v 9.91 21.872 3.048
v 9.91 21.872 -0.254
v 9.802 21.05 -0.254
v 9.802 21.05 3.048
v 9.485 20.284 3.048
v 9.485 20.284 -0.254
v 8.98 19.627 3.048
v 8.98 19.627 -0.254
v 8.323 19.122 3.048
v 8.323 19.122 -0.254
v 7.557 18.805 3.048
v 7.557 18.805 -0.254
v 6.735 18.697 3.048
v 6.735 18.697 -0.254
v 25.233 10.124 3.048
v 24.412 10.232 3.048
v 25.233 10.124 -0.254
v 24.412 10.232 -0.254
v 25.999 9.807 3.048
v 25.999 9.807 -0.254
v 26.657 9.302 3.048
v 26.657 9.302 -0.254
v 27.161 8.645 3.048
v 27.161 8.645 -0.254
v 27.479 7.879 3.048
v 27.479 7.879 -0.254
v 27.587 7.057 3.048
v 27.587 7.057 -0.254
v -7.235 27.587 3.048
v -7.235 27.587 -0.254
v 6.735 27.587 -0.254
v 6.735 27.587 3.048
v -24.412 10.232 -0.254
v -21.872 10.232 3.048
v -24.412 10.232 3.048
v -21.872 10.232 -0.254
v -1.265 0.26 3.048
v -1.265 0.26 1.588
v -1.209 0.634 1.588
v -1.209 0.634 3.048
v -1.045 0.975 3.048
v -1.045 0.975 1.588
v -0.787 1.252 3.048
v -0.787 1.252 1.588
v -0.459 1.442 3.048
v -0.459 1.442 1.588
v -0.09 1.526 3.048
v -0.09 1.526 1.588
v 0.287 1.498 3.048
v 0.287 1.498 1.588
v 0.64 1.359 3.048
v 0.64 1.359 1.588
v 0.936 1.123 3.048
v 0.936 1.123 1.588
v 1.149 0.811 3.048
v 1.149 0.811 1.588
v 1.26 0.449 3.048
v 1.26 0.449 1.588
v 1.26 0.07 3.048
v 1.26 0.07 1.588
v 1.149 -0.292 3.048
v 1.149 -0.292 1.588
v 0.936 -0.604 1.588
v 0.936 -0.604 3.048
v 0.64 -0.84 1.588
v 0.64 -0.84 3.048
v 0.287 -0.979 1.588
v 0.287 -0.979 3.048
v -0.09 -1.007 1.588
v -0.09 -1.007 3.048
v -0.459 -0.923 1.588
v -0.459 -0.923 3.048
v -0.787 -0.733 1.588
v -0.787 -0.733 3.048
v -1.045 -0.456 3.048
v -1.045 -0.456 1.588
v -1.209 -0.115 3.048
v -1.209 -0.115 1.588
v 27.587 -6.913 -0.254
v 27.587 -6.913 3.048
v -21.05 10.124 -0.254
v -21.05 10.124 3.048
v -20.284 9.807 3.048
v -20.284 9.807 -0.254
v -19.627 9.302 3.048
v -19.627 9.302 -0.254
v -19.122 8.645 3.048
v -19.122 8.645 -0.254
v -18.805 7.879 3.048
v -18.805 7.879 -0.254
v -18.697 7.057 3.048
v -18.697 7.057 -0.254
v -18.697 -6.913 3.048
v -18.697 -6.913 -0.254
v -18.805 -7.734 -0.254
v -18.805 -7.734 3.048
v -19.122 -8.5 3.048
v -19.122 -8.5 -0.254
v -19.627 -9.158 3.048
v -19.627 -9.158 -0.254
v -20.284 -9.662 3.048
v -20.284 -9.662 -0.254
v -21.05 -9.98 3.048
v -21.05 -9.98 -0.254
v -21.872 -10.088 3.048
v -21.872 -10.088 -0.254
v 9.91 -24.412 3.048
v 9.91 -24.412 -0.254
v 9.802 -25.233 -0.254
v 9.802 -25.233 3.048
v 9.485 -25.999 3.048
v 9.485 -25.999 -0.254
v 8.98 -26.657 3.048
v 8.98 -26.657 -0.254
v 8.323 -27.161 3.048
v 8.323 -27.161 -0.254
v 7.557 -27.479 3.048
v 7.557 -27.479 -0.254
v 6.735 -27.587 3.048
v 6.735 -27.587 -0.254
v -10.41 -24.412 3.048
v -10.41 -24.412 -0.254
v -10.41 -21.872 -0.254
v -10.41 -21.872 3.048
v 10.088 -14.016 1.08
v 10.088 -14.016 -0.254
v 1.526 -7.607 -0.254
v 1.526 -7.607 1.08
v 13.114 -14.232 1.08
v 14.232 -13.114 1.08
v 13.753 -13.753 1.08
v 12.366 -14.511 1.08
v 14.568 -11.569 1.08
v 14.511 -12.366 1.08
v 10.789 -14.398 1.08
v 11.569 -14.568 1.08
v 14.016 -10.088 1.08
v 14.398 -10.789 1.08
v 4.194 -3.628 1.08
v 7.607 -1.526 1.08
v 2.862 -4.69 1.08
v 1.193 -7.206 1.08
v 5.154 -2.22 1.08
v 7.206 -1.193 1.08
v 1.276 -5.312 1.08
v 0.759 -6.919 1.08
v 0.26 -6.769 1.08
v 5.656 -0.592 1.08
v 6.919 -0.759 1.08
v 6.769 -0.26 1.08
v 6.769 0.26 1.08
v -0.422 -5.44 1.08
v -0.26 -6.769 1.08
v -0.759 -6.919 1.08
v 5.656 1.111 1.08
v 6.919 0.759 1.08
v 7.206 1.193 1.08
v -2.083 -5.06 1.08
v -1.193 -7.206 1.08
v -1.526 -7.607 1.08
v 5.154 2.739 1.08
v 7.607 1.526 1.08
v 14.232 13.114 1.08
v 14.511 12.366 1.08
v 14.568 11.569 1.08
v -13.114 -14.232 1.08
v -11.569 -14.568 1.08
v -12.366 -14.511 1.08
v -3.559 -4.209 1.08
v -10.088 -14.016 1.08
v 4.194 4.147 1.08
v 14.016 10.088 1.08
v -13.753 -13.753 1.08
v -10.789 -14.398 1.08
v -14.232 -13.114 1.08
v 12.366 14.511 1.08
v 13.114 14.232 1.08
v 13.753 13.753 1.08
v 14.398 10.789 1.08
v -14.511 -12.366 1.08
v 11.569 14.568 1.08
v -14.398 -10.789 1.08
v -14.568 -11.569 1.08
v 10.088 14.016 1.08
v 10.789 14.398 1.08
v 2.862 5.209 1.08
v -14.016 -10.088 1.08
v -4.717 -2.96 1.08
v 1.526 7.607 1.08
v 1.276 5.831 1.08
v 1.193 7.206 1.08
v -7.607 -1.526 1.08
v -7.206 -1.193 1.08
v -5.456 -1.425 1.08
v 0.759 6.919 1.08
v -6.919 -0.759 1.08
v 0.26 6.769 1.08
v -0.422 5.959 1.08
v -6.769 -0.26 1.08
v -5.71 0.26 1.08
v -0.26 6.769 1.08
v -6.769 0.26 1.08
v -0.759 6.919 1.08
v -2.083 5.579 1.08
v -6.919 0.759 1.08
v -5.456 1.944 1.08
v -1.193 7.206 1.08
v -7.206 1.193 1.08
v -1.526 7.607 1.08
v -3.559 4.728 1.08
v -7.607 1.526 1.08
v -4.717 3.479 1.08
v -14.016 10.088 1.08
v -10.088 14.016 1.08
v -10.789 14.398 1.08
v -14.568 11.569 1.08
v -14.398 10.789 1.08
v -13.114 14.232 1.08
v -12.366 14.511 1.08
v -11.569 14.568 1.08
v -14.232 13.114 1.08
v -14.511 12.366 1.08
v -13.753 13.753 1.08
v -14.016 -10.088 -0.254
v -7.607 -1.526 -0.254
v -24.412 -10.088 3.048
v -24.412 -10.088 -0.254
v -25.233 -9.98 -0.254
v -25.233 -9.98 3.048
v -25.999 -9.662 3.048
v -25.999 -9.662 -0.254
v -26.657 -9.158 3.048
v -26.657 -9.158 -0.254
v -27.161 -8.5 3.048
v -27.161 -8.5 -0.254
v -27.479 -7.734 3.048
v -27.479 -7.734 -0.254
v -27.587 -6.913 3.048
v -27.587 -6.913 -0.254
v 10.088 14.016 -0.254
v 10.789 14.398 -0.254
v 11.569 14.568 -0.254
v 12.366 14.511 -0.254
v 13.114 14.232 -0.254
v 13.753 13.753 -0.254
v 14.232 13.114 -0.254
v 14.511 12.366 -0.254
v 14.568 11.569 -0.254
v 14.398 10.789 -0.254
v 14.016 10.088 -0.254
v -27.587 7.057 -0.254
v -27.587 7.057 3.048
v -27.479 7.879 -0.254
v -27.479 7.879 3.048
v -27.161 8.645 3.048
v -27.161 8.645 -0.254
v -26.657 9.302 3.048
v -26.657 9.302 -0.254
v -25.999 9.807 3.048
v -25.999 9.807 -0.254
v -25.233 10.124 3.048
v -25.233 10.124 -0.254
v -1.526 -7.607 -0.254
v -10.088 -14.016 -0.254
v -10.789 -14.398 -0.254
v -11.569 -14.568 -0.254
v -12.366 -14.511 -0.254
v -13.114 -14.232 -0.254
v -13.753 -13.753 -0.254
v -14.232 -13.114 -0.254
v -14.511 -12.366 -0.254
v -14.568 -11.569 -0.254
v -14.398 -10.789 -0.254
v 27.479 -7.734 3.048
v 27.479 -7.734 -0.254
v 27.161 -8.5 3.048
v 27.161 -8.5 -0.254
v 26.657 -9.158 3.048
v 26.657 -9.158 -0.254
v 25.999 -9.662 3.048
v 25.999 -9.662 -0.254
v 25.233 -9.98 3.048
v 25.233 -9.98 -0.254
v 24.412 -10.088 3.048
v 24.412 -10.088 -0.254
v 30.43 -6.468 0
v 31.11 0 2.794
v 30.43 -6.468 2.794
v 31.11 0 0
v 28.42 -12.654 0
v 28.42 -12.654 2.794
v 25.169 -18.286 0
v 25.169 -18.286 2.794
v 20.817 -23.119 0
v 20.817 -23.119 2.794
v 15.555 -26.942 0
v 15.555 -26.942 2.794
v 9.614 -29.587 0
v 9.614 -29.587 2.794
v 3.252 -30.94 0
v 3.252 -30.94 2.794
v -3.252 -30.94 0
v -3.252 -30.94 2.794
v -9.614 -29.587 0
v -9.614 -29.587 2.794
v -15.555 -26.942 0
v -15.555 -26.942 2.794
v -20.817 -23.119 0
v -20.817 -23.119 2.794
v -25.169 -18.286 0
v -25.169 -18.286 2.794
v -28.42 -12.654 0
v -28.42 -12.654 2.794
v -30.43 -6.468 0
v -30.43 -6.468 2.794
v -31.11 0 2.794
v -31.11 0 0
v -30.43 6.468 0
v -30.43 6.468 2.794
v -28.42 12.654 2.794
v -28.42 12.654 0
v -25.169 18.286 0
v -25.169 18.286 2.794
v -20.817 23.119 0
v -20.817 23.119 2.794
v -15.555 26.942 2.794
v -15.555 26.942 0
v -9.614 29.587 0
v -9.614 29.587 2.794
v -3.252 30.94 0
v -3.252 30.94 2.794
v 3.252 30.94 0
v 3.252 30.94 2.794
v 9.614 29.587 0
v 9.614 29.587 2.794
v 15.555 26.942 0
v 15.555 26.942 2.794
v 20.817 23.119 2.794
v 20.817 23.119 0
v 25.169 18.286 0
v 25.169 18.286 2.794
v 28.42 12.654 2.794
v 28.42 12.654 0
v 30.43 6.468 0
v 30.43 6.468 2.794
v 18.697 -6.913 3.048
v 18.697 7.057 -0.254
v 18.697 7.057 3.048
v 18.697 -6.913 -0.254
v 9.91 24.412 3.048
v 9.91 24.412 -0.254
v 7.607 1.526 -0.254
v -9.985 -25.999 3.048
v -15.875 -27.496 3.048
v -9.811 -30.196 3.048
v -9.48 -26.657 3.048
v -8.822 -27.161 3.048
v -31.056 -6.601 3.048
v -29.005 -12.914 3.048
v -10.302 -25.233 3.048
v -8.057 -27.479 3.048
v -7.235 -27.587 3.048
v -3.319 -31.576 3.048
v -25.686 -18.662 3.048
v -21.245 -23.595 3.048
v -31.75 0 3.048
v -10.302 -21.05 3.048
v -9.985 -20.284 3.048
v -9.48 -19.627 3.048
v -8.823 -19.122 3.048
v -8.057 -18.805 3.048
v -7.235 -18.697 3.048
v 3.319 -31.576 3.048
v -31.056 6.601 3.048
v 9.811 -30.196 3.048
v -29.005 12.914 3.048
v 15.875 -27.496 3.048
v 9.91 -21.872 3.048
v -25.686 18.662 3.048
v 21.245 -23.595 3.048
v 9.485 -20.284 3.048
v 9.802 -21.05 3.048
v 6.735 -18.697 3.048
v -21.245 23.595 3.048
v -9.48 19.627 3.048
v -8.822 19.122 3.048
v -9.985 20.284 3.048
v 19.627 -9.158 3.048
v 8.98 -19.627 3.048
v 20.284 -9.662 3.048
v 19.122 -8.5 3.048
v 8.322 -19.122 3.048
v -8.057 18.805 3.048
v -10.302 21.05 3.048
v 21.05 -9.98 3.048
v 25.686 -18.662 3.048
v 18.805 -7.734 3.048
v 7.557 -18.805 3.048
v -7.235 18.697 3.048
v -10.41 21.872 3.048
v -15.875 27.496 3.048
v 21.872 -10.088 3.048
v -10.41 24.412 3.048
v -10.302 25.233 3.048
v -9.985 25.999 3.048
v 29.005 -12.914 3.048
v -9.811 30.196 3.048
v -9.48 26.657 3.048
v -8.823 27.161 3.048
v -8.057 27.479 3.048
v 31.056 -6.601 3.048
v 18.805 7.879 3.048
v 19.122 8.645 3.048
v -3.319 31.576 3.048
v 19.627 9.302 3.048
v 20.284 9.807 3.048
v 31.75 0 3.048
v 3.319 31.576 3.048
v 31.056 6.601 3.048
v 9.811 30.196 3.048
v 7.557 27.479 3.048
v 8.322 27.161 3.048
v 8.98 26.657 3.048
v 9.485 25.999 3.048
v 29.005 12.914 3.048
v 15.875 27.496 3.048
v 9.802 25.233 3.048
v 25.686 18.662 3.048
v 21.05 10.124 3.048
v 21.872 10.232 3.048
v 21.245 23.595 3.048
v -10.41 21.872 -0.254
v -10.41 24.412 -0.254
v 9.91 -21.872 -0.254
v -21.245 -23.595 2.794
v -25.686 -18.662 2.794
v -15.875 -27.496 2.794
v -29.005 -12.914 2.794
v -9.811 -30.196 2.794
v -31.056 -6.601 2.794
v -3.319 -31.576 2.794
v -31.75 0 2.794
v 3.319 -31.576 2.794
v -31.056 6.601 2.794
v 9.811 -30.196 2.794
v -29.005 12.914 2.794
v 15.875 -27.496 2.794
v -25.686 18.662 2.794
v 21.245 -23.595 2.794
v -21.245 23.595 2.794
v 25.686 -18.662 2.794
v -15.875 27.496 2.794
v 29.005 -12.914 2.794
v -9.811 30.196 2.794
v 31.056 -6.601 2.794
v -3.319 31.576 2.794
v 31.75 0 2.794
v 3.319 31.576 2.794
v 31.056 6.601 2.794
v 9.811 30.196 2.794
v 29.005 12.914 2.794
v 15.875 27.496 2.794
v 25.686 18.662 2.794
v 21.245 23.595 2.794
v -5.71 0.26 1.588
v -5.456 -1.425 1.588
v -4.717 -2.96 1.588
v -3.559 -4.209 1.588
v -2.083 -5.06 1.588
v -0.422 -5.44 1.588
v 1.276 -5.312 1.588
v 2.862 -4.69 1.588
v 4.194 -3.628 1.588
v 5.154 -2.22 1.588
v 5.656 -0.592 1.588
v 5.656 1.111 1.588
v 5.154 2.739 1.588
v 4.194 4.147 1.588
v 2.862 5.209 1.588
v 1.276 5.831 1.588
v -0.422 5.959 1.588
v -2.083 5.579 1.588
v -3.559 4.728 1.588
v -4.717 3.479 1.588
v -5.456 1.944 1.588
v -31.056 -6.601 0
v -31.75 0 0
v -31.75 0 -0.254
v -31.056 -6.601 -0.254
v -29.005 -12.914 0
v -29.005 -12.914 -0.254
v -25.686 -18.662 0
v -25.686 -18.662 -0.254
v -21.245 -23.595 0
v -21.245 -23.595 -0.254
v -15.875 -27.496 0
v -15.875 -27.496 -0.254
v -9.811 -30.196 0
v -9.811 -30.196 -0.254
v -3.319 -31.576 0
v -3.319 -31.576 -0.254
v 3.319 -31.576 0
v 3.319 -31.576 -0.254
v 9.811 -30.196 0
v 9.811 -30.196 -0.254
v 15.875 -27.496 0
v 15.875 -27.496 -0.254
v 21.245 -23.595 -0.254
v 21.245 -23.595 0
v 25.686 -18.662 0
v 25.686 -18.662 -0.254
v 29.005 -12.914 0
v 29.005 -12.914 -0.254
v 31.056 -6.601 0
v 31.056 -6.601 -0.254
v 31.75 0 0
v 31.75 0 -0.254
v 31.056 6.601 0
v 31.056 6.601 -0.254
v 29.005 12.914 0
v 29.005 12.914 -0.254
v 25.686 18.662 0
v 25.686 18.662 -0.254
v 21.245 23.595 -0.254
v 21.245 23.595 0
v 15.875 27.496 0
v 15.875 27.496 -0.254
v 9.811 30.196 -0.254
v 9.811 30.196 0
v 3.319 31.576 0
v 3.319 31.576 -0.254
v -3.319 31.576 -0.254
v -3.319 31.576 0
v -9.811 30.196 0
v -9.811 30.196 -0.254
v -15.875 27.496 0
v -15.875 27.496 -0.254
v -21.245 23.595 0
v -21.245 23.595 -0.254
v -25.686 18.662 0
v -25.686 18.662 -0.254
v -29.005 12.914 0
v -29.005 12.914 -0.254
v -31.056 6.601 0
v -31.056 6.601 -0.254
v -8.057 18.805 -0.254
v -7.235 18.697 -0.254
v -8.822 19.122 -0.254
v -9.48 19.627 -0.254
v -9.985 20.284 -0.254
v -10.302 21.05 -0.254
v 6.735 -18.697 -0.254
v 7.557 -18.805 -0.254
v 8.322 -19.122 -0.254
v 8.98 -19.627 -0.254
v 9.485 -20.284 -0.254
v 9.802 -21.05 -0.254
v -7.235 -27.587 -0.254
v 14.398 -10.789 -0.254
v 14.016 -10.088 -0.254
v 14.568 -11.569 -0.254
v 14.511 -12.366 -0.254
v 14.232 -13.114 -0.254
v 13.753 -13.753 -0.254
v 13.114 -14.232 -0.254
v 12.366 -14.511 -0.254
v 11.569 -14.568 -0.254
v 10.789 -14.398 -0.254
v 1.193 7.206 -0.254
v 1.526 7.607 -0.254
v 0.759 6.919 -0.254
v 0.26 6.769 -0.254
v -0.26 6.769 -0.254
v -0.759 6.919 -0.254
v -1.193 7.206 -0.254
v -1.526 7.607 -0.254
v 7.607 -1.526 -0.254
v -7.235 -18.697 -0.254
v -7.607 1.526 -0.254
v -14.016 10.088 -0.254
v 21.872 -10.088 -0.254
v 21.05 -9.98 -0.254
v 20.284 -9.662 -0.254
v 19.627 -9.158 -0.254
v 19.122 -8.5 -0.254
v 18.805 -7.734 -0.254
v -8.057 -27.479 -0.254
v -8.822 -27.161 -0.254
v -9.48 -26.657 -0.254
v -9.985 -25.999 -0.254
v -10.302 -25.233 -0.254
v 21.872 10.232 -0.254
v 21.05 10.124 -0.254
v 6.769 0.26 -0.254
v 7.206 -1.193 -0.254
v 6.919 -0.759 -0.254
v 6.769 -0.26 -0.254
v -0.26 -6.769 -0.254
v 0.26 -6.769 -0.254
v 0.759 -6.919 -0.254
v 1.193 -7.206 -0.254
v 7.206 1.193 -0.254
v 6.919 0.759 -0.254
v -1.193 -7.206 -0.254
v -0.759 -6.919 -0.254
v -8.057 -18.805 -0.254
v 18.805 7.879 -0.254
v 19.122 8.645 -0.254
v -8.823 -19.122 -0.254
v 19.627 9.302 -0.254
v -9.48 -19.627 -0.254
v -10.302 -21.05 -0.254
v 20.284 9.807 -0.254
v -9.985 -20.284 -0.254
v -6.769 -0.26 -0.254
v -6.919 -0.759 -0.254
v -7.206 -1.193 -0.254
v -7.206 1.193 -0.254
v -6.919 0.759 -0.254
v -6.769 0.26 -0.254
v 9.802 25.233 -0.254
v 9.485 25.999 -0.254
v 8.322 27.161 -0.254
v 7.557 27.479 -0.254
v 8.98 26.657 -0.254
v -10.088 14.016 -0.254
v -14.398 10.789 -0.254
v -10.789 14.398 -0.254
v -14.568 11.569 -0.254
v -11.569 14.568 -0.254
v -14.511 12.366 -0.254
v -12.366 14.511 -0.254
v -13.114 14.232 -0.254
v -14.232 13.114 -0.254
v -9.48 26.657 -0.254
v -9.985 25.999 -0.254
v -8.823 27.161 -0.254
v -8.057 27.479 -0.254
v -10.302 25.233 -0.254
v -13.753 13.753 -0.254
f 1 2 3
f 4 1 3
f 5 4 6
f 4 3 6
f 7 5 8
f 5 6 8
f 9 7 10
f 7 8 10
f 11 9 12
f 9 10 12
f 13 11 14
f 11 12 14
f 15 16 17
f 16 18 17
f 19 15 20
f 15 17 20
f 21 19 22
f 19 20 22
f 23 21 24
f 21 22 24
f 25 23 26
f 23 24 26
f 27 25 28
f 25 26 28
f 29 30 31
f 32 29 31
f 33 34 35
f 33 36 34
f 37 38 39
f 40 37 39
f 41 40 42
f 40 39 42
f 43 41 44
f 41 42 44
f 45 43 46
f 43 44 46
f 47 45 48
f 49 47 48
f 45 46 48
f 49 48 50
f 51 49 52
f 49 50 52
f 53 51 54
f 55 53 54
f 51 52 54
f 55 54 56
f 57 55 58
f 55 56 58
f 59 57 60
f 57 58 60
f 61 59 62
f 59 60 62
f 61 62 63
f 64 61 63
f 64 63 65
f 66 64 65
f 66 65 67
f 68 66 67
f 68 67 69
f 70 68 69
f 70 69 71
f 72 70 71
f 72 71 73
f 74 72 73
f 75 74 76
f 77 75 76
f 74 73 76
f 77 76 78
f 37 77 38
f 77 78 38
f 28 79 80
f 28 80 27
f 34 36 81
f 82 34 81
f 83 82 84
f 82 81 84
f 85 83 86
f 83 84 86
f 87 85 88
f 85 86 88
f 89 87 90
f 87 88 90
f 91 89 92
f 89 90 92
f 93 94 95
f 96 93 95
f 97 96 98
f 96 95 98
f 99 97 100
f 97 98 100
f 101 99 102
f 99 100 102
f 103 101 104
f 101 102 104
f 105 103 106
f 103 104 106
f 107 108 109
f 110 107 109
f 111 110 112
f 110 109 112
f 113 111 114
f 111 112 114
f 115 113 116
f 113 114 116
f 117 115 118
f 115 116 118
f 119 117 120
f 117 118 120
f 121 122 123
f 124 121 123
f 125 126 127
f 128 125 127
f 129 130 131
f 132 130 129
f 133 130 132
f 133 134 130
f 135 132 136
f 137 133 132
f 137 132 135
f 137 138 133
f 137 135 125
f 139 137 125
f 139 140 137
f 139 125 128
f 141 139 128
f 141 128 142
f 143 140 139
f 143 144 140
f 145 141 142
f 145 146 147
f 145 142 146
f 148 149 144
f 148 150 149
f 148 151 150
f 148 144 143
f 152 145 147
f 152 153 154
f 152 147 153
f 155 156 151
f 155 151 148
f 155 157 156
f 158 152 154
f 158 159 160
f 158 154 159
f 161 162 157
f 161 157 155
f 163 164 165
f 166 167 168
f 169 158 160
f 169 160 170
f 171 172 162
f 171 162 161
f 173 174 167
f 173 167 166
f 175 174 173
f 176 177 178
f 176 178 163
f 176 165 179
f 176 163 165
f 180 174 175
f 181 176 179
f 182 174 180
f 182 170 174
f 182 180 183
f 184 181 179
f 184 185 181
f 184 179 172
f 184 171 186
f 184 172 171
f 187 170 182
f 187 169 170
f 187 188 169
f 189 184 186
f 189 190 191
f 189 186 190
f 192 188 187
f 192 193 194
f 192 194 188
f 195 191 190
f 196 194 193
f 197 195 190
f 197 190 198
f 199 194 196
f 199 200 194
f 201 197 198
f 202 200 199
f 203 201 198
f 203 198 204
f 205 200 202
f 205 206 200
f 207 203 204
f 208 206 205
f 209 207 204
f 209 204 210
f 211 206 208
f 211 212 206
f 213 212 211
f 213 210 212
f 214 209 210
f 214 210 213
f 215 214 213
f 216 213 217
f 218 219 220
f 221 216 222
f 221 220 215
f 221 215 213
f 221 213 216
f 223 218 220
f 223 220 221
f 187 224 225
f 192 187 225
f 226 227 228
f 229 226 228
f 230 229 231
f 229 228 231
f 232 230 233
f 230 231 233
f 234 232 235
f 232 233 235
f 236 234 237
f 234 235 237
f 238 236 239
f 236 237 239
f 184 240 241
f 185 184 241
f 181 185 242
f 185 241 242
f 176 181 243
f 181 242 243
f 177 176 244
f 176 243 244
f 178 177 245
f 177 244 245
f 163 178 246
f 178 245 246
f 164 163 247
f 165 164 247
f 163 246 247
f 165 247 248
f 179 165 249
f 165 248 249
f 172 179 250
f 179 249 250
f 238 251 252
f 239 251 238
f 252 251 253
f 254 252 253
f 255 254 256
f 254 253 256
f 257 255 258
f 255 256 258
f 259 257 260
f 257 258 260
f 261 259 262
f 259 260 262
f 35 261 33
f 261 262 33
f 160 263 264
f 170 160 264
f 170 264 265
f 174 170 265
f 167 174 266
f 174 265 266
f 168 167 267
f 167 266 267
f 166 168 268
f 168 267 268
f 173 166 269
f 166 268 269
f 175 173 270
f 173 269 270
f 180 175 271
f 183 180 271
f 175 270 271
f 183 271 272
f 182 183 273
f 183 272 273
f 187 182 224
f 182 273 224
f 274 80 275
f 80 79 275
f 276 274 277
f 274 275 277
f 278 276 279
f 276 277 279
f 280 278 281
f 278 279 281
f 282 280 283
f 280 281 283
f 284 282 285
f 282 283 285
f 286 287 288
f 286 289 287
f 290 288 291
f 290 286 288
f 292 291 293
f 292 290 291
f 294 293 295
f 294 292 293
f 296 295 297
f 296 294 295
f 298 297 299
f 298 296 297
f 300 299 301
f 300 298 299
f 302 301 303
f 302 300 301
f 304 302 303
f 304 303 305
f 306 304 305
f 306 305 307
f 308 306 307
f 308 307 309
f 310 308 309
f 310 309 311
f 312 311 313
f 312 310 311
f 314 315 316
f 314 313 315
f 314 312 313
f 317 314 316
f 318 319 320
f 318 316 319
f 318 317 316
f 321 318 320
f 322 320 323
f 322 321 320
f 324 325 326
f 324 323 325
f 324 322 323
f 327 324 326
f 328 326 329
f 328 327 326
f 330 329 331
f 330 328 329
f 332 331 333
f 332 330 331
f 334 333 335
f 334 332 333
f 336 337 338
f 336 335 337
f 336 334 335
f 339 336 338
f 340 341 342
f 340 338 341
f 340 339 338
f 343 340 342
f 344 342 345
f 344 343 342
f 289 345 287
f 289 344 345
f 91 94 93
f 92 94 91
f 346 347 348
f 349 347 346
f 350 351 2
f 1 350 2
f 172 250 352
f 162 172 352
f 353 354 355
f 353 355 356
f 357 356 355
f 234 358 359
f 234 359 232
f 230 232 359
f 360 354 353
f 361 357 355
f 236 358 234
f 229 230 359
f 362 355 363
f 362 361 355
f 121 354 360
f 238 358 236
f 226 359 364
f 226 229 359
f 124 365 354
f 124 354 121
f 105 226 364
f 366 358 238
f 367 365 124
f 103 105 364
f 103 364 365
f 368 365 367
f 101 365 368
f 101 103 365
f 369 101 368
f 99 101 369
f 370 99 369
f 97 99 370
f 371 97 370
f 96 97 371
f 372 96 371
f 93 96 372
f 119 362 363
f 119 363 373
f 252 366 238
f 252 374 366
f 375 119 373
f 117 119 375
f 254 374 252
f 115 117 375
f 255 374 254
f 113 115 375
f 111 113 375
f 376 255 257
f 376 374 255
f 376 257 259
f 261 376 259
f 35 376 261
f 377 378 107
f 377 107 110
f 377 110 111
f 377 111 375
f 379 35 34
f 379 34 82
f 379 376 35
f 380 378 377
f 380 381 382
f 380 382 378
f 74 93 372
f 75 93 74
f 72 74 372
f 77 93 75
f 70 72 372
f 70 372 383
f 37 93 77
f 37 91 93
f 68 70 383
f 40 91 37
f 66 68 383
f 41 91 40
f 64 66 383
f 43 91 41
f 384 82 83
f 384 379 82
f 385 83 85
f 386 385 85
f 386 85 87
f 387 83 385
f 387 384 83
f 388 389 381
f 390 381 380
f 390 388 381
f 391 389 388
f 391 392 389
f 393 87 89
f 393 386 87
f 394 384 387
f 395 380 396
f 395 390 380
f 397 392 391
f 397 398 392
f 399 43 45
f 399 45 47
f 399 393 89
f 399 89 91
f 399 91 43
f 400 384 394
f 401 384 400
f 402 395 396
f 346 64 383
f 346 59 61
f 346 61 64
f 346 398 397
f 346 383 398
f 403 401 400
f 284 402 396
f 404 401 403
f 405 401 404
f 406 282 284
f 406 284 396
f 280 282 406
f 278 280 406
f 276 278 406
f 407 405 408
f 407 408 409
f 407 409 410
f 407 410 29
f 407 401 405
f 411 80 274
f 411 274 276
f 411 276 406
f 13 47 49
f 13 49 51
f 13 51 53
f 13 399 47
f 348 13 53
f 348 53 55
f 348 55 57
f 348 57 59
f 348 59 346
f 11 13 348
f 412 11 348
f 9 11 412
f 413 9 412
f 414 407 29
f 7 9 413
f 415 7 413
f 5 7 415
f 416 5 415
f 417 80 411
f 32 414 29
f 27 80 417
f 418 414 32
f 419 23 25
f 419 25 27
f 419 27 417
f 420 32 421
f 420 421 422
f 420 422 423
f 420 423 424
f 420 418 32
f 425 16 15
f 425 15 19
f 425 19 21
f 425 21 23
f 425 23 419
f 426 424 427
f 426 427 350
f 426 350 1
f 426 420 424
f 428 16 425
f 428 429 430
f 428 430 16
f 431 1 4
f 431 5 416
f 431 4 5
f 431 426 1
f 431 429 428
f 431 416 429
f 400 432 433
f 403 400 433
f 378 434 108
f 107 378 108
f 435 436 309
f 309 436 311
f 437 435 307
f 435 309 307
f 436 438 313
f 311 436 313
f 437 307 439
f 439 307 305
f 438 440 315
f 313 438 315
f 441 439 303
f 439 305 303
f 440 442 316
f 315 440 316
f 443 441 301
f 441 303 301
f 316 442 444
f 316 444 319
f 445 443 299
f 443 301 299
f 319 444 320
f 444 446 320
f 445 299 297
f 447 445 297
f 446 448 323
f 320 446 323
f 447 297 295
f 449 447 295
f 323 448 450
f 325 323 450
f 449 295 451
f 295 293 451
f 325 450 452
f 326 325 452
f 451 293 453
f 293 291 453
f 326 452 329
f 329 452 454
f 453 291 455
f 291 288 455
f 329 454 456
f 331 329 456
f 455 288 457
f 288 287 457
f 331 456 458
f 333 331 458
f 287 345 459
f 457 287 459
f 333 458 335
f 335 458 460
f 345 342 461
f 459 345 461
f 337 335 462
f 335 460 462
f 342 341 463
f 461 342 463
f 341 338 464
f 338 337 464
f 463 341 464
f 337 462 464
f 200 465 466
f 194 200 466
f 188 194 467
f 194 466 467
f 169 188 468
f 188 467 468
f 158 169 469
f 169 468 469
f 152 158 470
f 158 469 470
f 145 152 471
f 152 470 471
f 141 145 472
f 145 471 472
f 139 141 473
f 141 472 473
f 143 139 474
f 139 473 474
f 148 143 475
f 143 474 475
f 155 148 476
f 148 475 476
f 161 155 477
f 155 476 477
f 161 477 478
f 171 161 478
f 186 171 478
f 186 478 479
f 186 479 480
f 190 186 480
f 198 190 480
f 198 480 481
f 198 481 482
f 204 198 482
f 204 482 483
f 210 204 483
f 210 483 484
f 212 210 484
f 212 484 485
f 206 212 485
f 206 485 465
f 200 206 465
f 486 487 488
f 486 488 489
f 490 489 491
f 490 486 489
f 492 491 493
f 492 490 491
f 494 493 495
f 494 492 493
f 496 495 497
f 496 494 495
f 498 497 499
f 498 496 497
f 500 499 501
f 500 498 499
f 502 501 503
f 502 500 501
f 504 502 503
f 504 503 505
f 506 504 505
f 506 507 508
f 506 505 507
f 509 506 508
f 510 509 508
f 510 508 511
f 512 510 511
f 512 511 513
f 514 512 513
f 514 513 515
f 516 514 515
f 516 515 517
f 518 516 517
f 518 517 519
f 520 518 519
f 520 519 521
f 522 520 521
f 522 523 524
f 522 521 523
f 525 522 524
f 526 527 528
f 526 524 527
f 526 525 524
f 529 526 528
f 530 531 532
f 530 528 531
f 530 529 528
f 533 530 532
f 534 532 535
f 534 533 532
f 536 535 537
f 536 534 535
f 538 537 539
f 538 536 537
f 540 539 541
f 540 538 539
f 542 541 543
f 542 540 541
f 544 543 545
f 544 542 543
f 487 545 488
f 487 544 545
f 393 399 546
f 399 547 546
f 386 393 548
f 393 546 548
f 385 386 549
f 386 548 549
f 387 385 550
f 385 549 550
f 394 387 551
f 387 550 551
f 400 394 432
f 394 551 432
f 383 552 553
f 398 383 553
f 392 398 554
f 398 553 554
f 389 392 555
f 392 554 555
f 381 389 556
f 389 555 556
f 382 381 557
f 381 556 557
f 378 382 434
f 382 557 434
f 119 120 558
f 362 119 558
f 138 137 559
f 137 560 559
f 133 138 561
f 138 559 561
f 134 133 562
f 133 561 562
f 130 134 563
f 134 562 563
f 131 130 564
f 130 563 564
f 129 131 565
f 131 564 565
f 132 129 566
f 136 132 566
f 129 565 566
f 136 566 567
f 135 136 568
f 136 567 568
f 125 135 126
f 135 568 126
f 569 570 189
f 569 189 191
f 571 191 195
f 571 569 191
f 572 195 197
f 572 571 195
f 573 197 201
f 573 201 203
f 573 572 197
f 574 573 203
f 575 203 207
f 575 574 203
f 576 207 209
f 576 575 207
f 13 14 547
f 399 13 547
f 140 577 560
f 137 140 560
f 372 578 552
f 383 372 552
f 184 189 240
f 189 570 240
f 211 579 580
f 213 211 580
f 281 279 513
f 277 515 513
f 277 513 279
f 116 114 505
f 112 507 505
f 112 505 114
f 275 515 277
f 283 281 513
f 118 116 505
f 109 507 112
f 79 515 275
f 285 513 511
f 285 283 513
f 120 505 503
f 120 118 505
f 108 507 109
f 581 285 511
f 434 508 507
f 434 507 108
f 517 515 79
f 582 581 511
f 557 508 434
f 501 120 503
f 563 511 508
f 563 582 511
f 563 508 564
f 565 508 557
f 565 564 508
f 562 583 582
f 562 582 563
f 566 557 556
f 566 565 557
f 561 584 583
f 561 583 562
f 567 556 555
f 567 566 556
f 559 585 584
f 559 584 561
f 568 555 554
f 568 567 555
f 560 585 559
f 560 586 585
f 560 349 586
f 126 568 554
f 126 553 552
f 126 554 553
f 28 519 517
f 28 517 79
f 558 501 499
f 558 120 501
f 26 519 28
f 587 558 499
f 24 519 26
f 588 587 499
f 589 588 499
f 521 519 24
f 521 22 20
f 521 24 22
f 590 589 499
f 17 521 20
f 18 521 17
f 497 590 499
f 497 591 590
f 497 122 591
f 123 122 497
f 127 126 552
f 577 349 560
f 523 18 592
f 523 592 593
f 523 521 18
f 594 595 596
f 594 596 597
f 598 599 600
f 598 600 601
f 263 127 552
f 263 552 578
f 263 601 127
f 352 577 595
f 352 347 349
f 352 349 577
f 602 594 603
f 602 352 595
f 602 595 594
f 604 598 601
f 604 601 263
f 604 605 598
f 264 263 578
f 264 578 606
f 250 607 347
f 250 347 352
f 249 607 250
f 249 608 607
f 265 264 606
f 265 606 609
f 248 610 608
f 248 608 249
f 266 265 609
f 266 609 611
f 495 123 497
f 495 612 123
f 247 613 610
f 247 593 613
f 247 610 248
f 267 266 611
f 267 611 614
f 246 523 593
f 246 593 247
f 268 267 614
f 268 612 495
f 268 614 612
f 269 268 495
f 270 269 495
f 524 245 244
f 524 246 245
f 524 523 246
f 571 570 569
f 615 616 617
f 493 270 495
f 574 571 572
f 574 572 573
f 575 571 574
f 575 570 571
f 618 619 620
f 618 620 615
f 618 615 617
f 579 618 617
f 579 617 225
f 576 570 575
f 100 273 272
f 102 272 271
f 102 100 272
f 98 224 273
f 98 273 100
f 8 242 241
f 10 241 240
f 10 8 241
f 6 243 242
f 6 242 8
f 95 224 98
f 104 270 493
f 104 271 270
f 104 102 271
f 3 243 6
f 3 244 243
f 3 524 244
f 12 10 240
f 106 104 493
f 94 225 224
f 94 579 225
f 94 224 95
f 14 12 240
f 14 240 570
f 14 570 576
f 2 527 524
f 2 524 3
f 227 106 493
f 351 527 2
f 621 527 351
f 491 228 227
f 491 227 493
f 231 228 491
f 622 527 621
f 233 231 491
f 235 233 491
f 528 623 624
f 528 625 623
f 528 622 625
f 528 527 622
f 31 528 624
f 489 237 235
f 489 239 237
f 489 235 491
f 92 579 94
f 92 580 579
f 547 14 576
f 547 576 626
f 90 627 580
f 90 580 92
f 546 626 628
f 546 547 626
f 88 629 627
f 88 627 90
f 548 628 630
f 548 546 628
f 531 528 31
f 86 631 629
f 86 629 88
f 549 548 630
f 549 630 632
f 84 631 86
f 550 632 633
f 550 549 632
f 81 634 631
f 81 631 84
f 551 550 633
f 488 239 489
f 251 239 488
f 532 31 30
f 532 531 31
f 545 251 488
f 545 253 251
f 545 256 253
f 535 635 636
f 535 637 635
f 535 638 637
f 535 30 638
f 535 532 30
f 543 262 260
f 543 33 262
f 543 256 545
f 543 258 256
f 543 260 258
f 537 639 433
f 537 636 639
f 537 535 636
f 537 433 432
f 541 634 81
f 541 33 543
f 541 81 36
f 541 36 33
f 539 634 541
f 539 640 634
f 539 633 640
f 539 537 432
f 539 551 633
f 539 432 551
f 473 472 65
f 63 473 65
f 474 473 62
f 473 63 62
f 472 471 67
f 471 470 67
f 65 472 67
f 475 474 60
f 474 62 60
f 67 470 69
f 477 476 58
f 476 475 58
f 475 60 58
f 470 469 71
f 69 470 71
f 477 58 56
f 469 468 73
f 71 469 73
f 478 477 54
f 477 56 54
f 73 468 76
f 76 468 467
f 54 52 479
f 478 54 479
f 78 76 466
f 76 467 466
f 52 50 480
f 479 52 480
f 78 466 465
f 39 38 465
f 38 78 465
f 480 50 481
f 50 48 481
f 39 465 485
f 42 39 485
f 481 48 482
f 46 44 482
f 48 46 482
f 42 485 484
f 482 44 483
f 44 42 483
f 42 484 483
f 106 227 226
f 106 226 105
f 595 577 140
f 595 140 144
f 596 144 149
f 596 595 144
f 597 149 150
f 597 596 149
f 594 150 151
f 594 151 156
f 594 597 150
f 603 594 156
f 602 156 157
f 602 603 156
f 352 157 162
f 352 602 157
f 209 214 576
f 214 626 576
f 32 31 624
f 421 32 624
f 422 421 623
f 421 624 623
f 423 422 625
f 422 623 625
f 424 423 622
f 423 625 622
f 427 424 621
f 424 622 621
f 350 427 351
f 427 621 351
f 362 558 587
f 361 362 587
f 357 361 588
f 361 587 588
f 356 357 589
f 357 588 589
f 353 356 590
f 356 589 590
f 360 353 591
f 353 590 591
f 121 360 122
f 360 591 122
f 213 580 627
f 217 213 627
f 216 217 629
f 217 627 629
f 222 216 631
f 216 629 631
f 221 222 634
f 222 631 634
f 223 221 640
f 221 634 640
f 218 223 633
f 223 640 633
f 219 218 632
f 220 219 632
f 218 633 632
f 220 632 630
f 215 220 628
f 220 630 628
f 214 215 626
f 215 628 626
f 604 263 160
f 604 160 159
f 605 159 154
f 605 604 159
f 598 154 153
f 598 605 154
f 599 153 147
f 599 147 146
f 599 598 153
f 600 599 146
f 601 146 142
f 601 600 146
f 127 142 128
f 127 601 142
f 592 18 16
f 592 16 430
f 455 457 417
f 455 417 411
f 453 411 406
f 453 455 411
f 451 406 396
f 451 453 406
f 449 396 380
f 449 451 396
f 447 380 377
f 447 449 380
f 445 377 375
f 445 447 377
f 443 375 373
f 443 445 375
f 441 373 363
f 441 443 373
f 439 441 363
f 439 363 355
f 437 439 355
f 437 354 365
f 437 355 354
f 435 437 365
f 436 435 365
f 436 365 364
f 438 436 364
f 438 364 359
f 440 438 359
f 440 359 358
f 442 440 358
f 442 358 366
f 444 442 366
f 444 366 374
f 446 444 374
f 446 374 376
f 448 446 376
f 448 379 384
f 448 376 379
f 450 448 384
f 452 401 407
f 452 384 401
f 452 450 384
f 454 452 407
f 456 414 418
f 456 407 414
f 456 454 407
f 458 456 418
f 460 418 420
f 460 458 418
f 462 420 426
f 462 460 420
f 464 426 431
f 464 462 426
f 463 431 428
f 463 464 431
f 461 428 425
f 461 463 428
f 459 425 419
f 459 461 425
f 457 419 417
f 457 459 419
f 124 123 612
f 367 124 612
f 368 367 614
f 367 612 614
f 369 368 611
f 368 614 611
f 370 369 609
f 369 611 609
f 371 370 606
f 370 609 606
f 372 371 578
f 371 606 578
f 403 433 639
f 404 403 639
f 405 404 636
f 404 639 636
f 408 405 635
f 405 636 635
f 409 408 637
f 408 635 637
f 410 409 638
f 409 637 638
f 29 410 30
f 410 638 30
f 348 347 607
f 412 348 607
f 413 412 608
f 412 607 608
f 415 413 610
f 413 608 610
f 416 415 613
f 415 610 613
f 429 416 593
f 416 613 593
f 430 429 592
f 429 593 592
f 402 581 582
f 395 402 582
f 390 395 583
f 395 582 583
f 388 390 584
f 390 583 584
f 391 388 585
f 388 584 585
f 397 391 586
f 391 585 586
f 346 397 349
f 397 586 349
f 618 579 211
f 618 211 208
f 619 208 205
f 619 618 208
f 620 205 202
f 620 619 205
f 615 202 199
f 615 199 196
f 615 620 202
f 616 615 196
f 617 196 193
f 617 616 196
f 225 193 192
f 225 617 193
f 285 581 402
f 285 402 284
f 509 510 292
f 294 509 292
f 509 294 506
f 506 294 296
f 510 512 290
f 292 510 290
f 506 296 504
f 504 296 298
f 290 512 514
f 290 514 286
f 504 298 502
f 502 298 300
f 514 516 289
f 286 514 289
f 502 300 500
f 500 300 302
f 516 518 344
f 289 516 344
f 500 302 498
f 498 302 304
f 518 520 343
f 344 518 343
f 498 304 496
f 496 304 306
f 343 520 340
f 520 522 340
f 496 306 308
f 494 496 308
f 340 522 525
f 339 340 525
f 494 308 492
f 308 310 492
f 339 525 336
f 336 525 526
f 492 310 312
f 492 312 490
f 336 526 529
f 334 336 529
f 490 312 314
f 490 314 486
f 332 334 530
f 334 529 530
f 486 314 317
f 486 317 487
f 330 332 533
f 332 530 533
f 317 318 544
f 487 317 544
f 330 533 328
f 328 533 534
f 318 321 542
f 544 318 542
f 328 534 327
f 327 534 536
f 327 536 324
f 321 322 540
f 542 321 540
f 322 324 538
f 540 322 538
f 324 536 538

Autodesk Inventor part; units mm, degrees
ref_plane "YZ Plane" through (0, 0, 0) normal (1, 0, 0) x (0, 1, 0)
ref_plane "XZ Plane" through (0, 0, 0) normal (0, 1, 0) x (-1, 0, 0)
ref_plane "XY Plane" through (0, 0, 0) normal (0, 0, 1) x (1, 0, 0)
sketch "Sketch1" plane through (0, 0, 0) normal (0, 0, 1) x (1, 0, 0)
  circle A0 centre (0, 0) radius 31.1101
extrude "Extrusion1" add sketch "Sketch1" along normal blind 2.794
sketch "Sketch2" plane through (0, 0, 0) normal (0, 0, -1) x (-1, 0, 0)
  circle A0 centre (0, 0) radius 31.75
  dimension "d2" = 63.5
extrude "Extrusion2" add sketch "Sketch2" along normal blind 0.254
sketch "Sketch3" plane through (0, 0, 2.794) normal (0, 0, 1) x (1, 0, 0)
  circle A0 centre (0, 0) radius 31.75
  dimension "d5" = 63.5
extrude "Extrusion3" add sketch "Sketch3" along normal blind 0.254
sketch "Sketch4" plane through (0, 0, -0.254) normal (0, 0, -1) x (-1, 0, 0)
  arc A0 (-1.5256, 7.6067) -> (1.5256, 7.6067) centre (0, 8.5367) ccw
  line L0 (-1.5256, 7.6067) -> (-10.0877, 14.0155)
  arc A1 (-10.0877, 14.0155) -> (-14.0155, 10.0877) centre (-11.7691, 11.7691) ccw
  line L1 (-14.0155, 10.0877) -> (-7.6067, 1.5256)
  arc A2 (-7.6067, -1.5256) -> (-7.6067, 1.5256) centre (-8.5367, 0) ccw
  line L2 (-7.6067, -1.5256) -> (-14.0155, -10.0877)
  arc A3 (-14.0155, -10.0877) -> (-10.0877, -14.0155) centre (-11.7691, -11.7691) ccw
  line L3 (-10.0877, -14.0155) -> (-1.5256, -7.6067)
  arc A4 (1.5256, -7.6067) -> (-1.5256, -7.6067) centre (0, -8.5367) ccw
  line L4 (1.5256, -7.6067) -> (10.0877, -14.0155)
  arc A5 (10.0877, -14.0155) -> (14.0155, -10.0877) centre (11.7691, -11.7691) ccw
  line L5 (14.0155, -10.0877) -> (7.6067, -1.5256)
  arc A6 (7.6067, 1.5256) -> (7.6067, -1.5256) centre (8.5367, 0) ccw
  line L6 (7.6067, 1.5256) -> (14.0155, 10.0877)
  arc A7 (14.0155, 10.0877) -> (10.0877, 14.0155) centre (11.7691, 11.7691) ccw
  line L7 (10.0877, 14.0155) -> (1.5256, 7.6067)
  circle A8 centre (0, 0) radius 5.27
  circle A9 centre (-4.9144, 4.9144) radius 0.75
  circle A10 centre (-7.3893, 7.3893) radius 0.75
  circle A11 centre (-9.8641, 9.8641) radius 0.75
  circle A12 centre (-12.339, 12.339) radius 0.75
  circle A13 centre (-4.9144, -4.9144) radius 0.75
  circle A14 centre (-7.3893, -7.3893) radius 0.75
  circle A15 centre (-9.8641, -9.8641) radius 0.75
  circle A16 centre (-12.339, -12.339) radius 0.75
  circle A17 centre (4.9144, -4.9144) radius 0.75
  circle A18 centre (7.3893, -7.3893) radius 0.75
  circle A19 centre (9.8641, -9.8641) radius 0.75
  circle A20 centre (12.339, -12.339) radius 0.75
  circle A21 centre (4.9144, 4.9144) radius 0.75
  circle A22 centre (7.3893, 7.3893) radius 0.75
  circle A23 centre (9.8641, 9.8641) radius 0.75
  circle A24 centre (12.339, 12.339) radius 0.75
extrude "Extrusion4" cut sketch "Sketch4" against normal blind 1.3335 contours A0 L7 A7 L6 A6 L5 A5 L4 A4 L3 A3 L2 A2 L1 A1 L0 | A8 | A9 | A10 | A11 | A12 | A13 | A14 | A15 | A16 | A17 | A18 | A19 | A20 | A21 | A22 | A23 | A24
sketch "Sketch5" plane through (0, 0, -0.254) normal (0, 0, -1) x (-1, 0, 0)
  point P0 (0, 0)
hole "Hole1" at (0, 0, -0.254) direction (0, 0, 1) diameter 10.541 depth 1.5875
hole "Hole2" at (0.0046, 0.2595, 1.3335) direction (0, 0, 1) diameter 10.541 depth 0.254
sketch "Sketch6" plane through (0, 0, -0.254) normal (0, 0, -1) x (-1, 0, 0)
  line L0 (-6.735, 18.6967) -> (7.235, 18.6967)
  line L1 (10.41, 21.8717) -> (10.41, 24.4117)
  line L2 (7.235, 27.5867) -> (-6.735, 27.5867)
  line L3 (-9.91, 24.4117) -> (-9.91, 21.8717)
  line L4 (21.8717, 10.2323) -> (24.4117, 10.2323)
  line L5 (27.5867, 7.0573) -> (27.5867, -6.9127)
  line L6 (24.4117, -10.0877) -> (21.8717, -10.0877)
  line L7 (18.6967, -6.9127) -> (18.6967, 7.0573)
  arc A0 (7.6067, 1.5256) -> (7.6067, -1.5256) centre (8.5367, 0) ccw projected
  arc A1 (-1.5256, 7.6067) -> (1.5256, 7.6067) centre (0, 8.5367) ccw projected
  line L8 (-21.8717, -10.0877) -> (-24.4117, -10.0877)
  line L9 (-27.5867, -6.9127) -> (-27.5867, 7.0573)
  line L10 (-24.4117, 10.2323) -> (-21.8717, 10.2323)
  line L11 (-18.6967, 7.0573) -> (-18.6967, -6.9127)
  arc A2 (-7.6067, -1.5256) -> (-7.6067, 1.5256) centre (-8.5367, 0) ccw projected
  line L12 (7.235, -18.6967) -> (-6.735, -18.6967)
  line L13 (-9.91, -21.8717) -> (-9.91, -24.4117)
  line L14 (-6.735, -27.5867) -> (7.235, -27.5867)
  line L15 (10.41, -24.4117) -> (10.41, -21.8717)
  arc A3 (1.5256, -7.6067) -> (-1.5256, -7.6067) centre (0, -8.5367) ccw projected
  arc A4 (27.5867, 7.0573) -> (24.4117, 10.2323) centre (24.4117, 7.0573) ccw
  arc A5 (24.4117, -10.0877) -> (27.5867, -6.9127) centre (24.4117, -6.9127) ccw
  arc A6 (18.6967, -6.9127) -> (21.8717, -10.0877) centre (21.8717, -6.9127) ccw
  arc A7 (21.8717, 10.2323) -> (18.6967, 7.0573) centre (21.8717, 7.0573) ccw
  arc A8 (7.235, -27.5867) -> (10.41, -24.4117) centre (7.235, -24.4117) ccw
  arc A9 (-9.91, -24.4117) -> (-6.735, -27.5867) centre (-6.735, -24.4117) ccw
  arc A10 (-6.735, -18.6967) -> (-9.91, -21.8717) centre (-6.735, -21.8717) ccw
  arc A11 (10.41, -21.8717) -> (7.235, -18.6967) centre (7.235, -21.8717) ccw
  arc A12 (-6.735, 27.5867) -> (-9.91, 24.4117) centre (-6.735, 24.4117) ccw
  arc A13 (10.41, 24.4117) -> (7.235, 27.5867) centre (7.235, 24.4117) ccw
  arc A14 (-9.91, 21.8717) -> (-6.735, 18.6967) centre (-6.735, 21.8717) ccw
  arc A15 (7.235, 18.6967) -> (10.41, 21.8717) centre (7.235, 21.8717) ccw
  arc A16 (-27.5867, -6.9127) -> (-24.4117, -10.0877) centre (-24.4117, -6.9127) ccw
  arc A17 (-24.4117, 10.2323) -> (-27.5867, 7.0573) centre (-24.4117, 7.0573) ccw
  arc A18 (-21.8717, -10.0877) -> (-18.6967, -6.9127) centre (-21.8717, -6.9127) ccw
  arc A19 (-18.6967, 7.0573) -> (-21.8717, 10.2323) centre (-21.8717, 7.0573) ccw
  circle A20 centre (0, 0) radius 1.27
  point P0 (-9.91, 18.6967)
  point P1 (10.41, 27.5867)
  point P2 (10.41, 18.6967)
  point P3 (-9.91, 27.5867)
  point P4 (18.6967, 10.2323)
  point P5 (27.5867, -10.0877)
  point P6 (27.5867, 10.2323)
  point P7 (18.6967, -10.0877)
  point P8 (-18.6967, -10.0877)
  point P9 (-27.5867, 10.2323)
  point P10 (-27.5867, -10.0877)
  point P11 (-18.6967, 10.2323)
  point P12 (10.41, -18.6967)
  point P13 (-9.91, -27.5867)
  point P14 (-9.91, -18.6967)
  point P15 (10.41, -27.5867)
  dimension "d26" = 10.16
  dimension "d27" = 8.89
  dimension "d28" = 20.32
  dimension "d29" = 10.16
  dimension "d30" = 20.32
  dimension "d31" = 8.89
  dimension "d32" = 10.16
  dimension "d33" = 20.32
  dimension "d34" = 8.89
  dimension "d35" = 10.16
  dimension "d36" = 8.89
  dimension "d37" = 20.32
  dimension "d40" = 3.175
  dimension "d41" = 2.54
extrude "Extrusion5" cut sketch "Sketch6" against normal blind 38.1 contours A14 L3 A12 L2 A13 L1 A15 L0 | L4 A4 L5 A5 L6 A6 L7 A7 | L8 A16 L9 A17 L10 A19 L11 A18 | A11 L15 A8 L14 A9 L13 A10 L12
sketch "Sketch7" plane through (0.0046, 0.2595, 1.5875) normal (0, 0, -1) x (-1, 0, 0)
  circle A0 centre (0, 0) radius 1.27
  point P0 (0.0046, -0.2595)
  dimension "d42" = 2.54
extrude "Extrusion6" cut sketch "Sketch7" along normal mid plane 25.4
sketch "Sketch8" plane through (0.0046, 0.2595, 1.5875) normal (0, 0, -1) x (-1, 0, 0)
  circle A0 centre (0, 0) radius 5.4861
  point P0 (0.0046, -0.2595)
extrude "Extrusion7" cut sketch "Sketch8" along normal blind 1.5875
sketch "Sketch9" plane through (0.0046, 0.2595, 1.5875) normal (0, 0, -1) x (-1, 0, 0)
  circle A0 centre (0, 0) radius 5.715
  point P0 (0.0046, -0.2595)
  dimension "d47" = 11.43
extrude "Extrusion8" cut sketch "Sketch9" along normal blind 25.4
properties part number "RTS  Wheel"
